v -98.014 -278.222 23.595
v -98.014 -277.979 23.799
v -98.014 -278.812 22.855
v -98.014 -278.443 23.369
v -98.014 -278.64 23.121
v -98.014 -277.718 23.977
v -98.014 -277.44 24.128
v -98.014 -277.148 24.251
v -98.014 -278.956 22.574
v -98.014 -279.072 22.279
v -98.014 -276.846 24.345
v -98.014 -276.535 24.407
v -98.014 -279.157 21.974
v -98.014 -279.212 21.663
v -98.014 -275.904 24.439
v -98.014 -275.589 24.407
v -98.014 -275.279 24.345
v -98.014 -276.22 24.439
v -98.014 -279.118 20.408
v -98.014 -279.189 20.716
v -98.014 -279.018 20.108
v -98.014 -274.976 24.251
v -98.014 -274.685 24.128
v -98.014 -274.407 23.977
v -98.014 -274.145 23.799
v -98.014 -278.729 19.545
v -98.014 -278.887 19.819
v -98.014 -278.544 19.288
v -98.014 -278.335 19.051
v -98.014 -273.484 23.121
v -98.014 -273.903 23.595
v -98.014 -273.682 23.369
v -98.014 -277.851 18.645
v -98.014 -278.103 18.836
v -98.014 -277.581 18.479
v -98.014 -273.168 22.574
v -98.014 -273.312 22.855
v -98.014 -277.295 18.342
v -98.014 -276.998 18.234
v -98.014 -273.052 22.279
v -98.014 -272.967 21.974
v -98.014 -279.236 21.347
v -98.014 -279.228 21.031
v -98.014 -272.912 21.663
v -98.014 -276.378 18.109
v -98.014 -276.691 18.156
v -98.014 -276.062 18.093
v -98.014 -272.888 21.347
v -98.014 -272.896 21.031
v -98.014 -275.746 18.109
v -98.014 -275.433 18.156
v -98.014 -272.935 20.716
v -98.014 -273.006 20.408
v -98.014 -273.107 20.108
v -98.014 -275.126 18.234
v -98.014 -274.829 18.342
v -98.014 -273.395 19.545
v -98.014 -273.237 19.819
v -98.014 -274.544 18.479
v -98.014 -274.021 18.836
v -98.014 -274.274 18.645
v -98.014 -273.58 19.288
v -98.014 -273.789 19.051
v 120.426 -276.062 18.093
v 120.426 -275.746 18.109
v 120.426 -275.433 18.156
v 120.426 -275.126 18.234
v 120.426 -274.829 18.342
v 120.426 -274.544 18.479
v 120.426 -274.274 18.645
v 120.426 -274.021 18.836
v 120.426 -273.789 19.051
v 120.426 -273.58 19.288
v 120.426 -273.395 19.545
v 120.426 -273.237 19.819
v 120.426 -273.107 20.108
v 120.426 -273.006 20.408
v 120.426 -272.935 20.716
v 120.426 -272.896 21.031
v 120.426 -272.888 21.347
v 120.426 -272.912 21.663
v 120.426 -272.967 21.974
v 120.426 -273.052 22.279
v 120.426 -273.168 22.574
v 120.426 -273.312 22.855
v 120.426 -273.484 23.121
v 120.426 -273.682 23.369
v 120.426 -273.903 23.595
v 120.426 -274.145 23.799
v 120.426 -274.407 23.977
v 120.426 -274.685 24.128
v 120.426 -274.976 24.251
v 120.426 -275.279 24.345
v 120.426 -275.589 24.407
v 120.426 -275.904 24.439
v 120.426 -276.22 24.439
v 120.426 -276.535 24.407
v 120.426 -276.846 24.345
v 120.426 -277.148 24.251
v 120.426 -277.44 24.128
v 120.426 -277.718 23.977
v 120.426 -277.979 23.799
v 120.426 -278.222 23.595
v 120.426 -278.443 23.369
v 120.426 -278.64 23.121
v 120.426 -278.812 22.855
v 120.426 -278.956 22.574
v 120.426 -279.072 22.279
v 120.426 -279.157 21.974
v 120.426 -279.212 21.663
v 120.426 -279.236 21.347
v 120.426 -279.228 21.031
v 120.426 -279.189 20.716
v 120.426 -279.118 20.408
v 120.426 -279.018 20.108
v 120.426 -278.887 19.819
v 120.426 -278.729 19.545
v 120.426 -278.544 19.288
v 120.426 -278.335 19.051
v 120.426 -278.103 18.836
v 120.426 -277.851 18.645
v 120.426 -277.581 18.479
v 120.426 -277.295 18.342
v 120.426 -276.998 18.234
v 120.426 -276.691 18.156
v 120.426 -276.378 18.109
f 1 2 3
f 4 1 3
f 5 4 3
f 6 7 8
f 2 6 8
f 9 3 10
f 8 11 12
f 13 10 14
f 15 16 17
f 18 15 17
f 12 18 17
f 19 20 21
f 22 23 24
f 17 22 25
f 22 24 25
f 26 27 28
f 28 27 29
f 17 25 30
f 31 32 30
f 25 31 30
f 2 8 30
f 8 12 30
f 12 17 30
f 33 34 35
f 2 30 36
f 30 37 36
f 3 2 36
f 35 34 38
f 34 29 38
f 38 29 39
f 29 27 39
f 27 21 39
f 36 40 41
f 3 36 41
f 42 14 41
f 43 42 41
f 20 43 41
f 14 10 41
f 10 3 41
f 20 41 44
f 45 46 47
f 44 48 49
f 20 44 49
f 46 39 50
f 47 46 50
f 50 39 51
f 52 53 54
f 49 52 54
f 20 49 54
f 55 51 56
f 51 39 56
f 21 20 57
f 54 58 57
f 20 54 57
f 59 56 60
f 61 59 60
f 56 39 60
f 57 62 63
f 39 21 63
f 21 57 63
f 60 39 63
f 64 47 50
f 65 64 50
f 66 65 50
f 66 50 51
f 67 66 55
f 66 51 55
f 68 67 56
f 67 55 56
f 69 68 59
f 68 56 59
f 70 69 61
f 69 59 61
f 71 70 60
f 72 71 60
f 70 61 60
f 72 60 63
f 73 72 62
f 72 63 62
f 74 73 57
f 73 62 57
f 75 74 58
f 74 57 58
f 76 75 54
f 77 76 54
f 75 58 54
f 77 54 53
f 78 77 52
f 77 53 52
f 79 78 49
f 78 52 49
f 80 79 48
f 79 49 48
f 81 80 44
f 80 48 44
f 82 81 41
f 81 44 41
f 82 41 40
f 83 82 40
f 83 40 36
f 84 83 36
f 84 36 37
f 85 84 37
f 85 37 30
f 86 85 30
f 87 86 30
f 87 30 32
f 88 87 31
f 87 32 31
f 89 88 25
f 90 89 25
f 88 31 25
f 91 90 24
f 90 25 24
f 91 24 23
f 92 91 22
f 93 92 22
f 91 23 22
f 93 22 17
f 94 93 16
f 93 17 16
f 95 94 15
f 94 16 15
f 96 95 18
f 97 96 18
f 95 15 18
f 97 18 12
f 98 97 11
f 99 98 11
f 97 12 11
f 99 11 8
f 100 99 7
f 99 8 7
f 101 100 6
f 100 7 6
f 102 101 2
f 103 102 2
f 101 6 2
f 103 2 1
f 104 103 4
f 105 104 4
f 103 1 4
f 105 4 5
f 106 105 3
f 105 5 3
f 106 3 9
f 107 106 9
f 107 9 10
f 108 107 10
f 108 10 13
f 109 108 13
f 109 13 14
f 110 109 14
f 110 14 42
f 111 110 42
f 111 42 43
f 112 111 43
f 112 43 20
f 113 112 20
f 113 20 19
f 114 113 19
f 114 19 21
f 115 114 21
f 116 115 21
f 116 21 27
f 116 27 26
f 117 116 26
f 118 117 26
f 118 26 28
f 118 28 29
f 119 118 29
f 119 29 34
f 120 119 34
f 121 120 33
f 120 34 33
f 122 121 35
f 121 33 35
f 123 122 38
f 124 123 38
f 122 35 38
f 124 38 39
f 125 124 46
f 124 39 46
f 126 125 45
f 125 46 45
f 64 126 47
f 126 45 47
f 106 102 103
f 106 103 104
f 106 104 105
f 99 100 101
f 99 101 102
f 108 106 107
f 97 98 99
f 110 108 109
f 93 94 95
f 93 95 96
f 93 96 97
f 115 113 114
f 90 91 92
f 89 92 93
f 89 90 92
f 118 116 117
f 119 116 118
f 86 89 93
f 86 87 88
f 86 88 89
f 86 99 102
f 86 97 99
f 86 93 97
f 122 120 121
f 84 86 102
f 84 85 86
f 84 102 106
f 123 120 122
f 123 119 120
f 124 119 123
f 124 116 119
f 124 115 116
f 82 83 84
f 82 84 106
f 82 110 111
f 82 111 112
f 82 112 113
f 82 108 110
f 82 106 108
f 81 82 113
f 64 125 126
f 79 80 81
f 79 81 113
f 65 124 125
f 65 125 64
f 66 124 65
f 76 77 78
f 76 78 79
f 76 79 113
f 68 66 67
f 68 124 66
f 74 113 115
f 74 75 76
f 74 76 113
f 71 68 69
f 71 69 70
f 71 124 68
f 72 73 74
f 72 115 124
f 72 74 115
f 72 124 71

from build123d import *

# Parameters (mm, degrees)
BOSS_EXTRUDE1_OUTLINE_R = 3.175
BOSS_EXTRUDE1_DEPTH     = 218.44


# Read off the part's stored shape, not the designer's step: Boss-Extrude1
with BuildPart() as part:
    # Boss-Extrude1 outline → Boss-Extrude1 (new body)
    with BuildSketch(Plane(origin=(-98.013718438, 0, 0), x_dir=(0, 0, -1), z_dir=(1, 0, 0))):
        with Locations((-21.267819308, -276.062087489)):
            Circle(BOSS_EXTRUDE1_OUTLINE_R)
    extrude(amount=BOSS_EXTRUDE1_DEPTH)


solid = part.part
